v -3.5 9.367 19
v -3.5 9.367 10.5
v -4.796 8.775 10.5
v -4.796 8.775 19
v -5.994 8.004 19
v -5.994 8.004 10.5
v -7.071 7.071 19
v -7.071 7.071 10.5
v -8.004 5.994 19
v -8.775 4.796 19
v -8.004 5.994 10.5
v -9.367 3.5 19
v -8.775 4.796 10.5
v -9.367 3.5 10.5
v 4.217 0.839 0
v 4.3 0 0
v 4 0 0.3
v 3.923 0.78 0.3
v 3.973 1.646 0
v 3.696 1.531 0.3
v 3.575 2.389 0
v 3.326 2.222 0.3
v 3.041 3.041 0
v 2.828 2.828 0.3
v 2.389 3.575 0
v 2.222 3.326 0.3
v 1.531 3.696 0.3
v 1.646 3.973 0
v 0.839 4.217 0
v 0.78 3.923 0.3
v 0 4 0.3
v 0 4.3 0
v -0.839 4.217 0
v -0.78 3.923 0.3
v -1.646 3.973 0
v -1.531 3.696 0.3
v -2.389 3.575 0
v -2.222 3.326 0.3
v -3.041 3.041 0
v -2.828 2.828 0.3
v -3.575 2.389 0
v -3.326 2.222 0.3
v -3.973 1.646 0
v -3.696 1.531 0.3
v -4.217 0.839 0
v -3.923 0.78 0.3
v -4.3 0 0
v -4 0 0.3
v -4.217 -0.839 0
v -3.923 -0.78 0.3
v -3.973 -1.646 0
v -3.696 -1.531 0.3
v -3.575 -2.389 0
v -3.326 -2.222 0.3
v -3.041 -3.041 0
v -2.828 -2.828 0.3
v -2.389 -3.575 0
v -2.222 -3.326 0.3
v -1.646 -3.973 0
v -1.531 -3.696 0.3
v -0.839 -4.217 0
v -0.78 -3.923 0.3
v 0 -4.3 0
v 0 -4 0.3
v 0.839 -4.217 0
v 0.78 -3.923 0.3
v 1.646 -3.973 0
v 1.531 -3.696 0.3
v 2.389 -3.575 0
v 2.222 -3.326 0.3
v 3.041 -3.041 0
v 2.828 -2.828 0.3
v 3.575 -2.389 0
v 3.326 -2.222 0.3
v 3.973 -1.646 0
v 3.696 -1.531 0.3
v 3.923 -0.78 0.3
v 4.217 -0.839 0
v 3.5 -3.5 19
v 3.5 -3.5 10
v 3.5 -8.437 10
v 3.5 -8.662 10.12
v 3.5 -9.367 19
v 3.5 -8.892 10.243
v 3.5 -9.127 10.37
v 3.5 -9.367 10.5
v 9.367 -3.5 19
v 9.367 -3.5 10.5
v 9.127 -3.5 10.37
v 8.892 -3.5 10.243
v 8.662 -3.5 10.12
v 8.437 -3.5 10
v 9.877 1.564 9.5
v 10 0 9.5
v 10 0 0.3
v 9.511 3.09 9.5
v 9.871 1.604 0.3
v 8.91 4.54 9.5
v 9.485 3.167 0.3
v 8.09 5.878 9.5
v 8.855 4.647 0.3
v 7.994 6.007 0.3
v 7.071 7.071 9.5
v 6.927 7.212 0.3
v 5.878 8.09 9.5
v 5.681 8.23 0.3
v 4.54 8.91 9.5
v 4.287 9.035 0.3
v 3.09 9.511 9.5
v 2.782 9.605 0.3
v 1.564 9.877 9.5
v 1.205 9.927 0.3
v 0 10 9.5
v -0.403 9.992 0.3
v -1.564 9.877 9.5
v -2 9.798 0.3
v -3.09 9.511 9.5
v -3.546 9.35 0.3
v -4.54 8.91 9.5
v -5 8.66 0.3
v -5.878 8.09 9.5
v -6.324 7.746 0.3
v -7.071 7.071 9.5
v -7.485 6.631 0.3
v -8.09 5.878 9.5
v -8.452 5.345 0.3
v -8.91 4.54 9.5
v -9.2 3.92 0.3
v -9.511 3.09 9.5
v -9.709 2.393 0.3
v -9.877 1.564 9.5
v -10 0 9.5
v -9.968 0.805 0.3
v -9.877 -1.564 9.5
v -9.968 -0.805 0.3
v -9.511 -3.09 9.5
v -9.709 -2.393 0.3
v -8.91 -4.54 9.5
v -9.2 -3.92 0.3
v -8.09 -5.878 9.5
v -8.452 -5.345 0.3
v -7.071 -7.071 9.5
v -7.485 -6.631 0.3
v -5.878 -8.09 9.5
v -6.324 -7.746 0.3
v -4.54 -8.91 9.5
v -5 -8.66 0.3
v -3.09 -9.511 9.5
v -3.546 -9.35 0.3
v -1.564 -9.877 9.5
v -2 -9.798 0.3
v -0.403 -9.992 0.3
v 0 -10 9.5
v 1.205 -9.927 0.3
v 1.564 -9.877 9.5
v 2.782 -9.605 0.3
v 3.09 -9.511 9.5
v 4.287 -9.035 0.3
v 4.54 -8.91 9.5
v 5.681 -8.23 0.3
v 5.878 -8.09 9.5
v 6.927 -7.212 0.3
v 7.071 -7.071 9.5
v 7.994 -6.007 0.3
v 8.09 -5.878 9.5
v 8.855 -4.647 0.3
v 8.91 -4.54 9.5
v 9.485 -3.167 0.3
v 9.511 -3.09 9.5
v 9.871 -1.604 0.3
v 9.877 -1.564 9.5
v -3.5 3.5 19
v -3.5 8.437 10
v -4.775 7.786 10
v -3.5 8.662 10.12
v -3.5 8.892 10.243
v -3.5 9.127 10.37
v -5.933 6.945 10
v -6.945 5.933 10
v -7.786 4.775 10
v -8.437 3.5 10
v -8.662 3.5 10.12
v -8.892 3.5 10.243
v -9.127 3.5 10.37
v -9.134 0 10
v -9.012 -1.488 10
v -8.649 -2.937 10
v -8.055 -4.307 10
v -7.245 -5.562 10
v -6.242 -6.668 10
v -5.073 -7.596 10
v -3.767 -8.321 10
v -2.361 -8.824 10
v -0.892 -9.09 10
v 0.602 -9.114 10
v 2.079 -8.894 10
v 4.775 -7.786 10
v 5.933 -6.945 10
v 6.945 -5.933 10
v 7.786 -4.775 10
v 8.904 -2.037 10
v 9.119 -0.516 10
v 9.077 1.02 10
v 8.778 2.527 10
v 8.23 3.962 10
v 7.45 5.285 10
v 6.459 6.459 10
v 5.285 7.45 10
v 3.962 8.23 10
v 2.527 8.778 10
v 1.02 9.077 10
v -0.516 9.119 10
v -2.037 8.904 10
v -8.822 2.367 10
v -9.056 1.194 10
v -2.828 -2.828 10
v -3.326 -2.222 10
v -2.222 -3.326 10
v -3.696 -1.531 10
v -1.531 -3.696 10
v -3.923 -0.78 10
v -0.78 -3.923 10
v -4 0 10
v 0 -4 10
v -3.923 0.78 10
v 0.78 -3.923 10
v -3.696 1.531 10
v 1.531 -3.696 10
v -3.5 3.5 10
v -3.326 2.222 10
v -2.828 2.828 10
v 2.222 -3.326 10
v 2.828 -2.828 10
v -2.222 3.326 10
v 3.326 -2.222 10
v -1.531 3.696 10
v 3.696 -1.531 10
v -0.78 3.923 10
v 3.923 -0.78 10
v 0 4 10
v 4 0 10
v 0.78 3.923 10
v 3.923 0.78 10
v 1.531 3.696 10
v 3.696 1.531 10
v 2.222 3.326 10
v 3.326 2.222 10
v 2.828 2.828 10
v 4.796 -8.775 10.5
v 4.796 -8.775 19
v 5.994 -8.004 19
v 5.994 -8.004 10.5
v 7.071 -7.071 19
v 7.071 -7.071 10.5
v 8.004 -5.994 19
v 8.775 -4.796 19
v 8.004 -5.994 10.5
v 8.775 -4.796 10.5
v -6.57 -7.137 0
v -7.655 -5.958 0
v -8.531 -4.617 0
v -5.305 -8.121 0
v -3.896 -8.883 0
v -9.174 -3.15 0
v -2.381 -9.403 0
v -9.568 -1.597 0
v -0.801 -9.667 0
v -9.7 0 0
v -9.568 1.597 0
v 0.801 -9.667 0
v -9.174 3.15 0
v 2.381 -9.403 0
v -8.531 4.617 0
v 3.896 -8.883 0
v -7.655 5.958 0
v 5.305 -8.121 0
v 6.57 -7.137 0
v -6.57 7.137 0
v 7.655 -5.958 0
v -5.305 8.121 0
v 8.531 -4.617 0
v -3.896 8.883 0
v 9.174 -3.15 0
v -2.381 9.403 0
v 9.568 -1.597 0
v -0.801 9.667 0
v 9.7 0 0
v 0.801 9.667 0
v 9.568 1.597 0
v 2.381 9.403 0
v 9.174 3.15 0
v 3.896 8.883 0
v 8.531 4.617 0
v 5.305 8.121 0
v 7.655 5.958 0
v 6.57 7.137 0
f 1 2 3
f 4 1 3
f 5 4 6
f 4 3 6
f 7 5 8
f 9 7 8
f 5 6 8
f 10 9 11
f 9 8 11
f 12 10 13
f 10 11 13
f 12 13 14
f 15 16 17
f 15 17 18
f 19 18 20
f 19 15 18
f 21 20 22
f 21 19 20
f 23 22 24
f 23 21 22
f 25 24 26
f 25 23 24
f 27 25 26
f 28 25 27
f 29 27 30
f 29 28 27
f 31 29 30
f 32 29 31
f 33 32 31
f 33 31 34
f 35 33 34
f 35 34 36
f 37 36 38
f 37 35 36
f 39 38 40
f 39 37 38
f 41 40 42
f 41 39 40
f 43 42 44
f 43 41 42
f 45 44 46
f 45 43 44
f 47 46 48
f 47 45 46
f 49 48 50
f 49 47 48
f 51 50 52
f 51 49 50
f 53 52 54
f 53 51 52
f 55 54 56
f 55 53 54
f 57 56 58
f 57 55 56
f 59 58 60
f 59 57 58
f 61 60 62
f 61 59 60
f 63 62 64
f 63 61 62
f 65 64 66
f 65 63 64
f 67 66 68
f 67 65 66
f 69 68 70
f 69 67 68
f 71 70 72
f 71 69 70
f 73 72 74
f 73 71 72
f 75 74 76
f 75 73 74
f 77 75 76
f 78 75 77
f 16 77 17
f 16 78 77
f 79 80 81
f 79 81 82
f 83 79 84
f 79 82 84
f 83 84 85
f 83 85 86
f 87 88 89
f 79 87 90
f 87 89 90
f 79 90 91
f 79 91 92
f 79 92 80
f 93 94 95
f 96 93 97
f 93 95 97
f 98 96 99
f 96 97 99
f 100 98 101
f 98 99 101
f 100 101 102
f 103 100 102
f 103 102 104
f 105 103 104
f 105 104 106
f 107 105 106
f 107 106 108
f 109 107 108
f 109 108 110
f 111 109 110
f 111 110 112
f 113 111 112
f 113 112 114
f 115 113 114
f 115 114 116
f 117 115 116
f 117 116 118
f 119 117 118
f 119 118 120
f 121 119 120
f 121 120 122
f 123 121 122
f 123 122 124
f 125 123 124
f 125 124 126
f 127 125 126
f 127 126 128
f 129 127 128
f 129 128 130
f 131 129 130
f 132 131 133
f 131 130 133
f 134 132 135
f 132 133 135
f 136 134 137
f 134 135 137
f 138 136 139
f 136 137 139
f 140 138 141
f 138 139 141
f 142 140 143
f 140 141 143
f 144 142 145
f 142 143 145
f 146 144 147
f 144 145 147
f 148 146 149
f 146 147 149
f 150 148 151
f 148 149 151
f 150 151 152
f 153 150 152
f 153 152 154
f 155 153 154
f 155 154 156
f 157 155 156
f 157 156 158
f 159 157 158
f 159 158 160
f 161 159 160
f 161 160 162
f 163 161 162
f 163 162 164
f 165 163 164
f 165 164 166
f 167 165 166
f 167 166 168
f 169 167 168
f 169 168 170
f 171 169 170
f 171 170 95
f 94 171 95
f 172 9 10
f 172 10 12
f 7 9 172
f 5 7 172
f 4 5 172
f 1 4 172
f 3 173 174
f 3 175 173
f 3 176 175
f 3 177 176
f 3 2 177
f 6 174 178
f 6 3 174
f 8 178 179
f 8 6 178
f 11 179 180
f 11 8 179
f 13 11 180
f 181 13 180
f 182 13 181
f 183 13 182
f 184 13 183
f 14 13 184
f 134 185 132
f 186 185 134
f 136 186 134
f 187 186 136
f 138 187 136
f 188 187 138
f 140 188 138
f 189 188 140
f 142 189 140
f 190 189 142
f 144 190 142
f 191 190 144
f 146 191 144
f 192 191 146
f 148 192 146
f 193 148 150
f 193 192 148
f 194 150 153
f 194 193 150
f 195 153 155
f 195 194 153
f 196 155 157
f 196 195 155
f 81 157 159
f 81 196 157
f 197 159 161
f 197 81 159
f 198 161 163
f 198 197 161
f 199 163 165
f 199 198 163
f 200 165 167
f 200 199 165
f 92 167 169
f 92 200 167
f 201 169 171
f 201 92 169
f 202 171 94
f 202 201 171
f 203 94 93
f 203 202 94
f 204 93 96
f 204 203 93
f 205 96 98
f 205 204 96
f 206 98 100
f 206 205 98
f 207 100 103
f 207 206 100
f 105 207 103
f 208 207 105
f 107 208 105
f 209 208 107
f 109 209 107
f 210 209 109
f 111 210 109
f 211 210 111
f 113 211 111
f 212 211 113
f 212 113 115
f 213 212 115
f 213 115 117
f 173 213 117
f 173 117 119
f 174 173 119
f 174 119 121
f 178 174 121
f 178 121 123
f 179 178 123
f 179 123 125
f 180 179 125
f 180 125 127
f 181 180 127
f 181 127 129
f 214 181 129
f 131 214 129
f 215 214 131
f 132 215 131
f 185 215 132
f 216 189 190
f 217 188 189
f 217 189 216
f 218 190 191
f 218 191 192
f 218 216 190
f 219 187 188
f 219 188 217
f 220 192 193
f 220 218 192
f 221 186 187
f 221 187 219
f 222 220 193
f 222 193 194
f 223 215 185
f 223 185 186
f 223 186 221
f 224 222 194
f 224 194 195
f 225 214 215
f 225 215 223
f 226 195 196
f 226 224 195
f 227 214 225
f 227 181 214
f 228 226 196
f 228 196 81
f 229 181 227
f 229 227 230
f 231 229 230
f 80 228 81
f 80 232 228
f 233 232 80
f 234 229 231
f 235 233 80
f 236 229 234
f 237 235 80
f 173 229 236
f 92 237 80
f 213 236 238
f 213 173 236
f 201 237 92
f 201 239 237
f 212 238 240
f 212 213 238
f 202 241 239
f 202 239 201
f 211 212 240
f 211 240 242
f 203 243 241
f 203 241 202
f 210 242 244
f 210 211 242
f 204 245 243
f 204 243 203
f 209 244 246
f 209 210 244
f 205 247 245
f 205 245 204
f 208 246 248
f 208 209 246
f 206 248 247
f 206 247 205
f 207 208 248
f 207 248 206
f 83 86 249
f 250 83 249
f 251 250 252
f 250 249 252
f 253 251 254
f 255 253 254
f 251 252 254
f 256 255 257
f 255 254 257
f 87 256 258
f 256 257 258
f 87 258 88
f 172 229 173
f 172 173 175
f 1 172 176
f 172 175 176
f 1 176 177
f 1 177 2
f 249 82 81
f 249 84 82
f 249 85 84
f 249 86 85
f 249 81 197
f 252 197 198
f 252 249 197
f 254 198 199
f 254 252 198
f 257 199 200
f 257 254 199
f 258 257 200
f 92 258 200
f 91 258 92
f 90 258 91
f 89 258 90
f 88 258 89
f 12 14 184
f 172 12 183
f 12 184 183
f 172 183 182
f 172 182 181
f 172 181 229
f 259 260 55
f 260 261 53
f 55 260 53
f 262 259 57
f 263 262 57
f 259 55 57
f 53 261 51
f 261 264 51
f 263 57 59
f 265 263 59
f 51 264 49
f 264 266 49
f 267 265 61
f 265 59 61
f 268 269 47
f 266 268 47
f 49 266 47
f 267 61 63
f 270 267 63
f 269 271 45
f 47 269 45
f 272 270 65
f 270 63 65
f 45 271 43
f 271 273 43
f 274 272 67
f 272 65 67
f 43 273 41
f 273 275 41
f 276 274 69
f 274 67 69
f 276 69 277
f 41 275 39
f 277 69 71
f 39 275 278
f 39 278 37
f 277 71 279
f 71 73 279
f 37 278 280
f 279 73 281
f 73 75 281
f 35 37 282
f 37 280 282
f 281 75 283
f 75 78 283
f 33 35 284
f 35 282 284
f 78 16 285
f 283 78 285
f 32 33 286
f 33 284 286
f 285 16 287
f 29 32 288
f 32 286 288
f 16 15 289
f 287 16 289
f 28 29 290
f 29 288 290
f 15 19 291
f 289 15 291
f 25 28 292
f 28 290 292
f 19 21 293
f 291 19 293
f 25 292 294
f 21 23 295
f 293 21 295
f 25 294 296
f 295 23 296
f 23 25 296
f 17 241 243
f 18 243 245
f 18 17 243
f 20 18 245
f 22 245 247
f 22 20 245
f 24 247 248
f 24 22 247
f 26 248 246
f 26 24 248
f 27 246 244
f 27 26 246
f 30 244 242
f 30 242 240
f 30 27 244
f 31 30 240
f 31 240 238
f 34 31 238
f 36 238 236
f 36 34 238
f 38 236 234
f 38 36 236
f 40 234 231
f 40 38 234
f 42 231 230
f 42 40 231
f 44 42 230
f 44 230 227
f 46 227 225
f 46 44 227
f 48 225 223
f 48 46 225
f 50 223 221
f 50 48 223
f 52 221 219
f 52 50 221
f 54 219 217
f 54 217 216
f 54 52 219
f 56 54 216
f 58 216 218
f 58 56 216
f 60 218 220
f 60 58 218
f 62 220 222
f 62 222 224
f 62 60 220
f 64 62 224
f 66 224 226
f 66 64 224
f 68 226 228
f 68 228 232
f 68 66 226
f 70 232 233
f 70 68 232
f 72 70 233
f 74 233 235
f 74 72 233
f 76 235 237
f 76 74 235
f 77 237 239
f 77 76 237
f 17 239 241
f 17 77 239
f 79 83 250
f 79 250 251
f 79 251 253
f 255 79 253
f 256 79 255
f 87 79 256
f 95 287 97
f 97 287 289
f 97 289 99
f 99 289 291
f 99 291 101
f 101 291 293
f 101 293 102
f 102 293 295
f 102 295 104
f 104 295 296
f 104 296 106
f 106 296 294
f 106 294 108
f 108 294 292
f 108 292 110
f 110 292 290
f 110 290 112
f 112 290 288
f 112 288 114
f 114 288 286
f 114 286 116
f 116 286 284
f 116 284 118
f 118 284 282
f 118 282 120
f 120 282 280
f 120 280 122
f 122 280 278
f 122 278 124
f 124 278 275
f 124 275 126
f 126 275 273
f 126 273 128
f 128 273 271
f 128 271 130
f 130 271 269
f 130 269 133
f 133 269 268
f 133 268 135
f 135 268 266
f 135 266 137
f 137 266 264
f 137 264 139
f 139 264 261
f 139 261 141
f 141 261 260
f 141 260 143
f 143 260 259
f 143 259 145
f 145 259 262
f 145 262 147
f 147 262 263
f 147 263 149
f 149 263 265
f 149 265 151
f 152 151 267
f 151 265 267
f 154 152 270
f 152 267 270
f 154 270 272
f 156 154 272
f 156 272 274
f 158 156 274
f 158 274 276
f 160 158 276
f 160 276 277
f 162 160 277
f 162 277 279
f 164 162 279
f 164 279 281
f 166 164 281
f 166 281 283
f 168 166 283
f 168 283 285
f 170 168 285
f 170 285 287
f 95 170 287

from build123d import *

# Parameters (mm, degrees)
SKETCH_1_R      = 10
SKETCH_1_R_2    = 4
EXTRUDE_1_DEPTH = 10
CHAMFER_1_SIZE  = 0.3
EXTRUDE_2_DEPTH = 9


with BuildPart() as part:
    # 스케치1 → 보스-돌출1 (new body)
    with BuildSketch(Plane.XY):
        Circle(SKETCH_1_R)
        Circle(SKETCH_1_R_2, mode=Mode.SUBTRACT)
    extrude(amount=EXTRUDE_1_DEPTH)

    # 모따기1
    chamfer_1_edges = [part.edges().sort_by_distance(p)[0] for p in [
        (-10, 0, 0),
        (-4, 0, 0),
    ]]
    chamfer(chamfer_1_edges, length=CHAMFER_1_SIZE)

    # 스케치2 → 보스-돌출2 (add)
    with BuildSketch(Plane.XY.offset(10)):
        with BuildLine():
            ThreePointArc((-3.5, 9.367496998), (-7.071067812, 7.071067812), (-9.367496998, 3.5))
            Line((-9.367496998, 3.5), (-3.5, 3.5))
            Line((-3.5, 3.5), (-3.5, 9.367496998))
        make_face()
        with BuildLine():
            Line((9.367496998, -3.5), (3.5, -3.5))
            Line((3.5, -3.5), (3.5, -9.367496998))
            ThreePointArc((3.5, -9.367496998), (7.071067812, -7.071067812), (9.367496998, -3.5))
        make_face()
    extrude(amount=EXTRUDE_2_DEPTH)

    # 스케치3 → 컷-회전1 (revolve, cut)
    with BuildSketch(Plane(origin=(0, 0, 0), x_dir=(1, 0, 0), z_dir=(0, 1, 0)), mode=Mode.PRIVATE) as cut_revolve_1_sk:
        Polygon((9.133974596, -10), (10, -10.5), (10, -9.5), align=None)
    revolve(cut_revolve_1_sk.sketch.rotate(Axis((0, 0, 0), (0, 0, 1)), 180), axis=Axis((0, 0, 0), (0, 0, 1)), mode=Mode.SUBTRACT)


solid = part.part
